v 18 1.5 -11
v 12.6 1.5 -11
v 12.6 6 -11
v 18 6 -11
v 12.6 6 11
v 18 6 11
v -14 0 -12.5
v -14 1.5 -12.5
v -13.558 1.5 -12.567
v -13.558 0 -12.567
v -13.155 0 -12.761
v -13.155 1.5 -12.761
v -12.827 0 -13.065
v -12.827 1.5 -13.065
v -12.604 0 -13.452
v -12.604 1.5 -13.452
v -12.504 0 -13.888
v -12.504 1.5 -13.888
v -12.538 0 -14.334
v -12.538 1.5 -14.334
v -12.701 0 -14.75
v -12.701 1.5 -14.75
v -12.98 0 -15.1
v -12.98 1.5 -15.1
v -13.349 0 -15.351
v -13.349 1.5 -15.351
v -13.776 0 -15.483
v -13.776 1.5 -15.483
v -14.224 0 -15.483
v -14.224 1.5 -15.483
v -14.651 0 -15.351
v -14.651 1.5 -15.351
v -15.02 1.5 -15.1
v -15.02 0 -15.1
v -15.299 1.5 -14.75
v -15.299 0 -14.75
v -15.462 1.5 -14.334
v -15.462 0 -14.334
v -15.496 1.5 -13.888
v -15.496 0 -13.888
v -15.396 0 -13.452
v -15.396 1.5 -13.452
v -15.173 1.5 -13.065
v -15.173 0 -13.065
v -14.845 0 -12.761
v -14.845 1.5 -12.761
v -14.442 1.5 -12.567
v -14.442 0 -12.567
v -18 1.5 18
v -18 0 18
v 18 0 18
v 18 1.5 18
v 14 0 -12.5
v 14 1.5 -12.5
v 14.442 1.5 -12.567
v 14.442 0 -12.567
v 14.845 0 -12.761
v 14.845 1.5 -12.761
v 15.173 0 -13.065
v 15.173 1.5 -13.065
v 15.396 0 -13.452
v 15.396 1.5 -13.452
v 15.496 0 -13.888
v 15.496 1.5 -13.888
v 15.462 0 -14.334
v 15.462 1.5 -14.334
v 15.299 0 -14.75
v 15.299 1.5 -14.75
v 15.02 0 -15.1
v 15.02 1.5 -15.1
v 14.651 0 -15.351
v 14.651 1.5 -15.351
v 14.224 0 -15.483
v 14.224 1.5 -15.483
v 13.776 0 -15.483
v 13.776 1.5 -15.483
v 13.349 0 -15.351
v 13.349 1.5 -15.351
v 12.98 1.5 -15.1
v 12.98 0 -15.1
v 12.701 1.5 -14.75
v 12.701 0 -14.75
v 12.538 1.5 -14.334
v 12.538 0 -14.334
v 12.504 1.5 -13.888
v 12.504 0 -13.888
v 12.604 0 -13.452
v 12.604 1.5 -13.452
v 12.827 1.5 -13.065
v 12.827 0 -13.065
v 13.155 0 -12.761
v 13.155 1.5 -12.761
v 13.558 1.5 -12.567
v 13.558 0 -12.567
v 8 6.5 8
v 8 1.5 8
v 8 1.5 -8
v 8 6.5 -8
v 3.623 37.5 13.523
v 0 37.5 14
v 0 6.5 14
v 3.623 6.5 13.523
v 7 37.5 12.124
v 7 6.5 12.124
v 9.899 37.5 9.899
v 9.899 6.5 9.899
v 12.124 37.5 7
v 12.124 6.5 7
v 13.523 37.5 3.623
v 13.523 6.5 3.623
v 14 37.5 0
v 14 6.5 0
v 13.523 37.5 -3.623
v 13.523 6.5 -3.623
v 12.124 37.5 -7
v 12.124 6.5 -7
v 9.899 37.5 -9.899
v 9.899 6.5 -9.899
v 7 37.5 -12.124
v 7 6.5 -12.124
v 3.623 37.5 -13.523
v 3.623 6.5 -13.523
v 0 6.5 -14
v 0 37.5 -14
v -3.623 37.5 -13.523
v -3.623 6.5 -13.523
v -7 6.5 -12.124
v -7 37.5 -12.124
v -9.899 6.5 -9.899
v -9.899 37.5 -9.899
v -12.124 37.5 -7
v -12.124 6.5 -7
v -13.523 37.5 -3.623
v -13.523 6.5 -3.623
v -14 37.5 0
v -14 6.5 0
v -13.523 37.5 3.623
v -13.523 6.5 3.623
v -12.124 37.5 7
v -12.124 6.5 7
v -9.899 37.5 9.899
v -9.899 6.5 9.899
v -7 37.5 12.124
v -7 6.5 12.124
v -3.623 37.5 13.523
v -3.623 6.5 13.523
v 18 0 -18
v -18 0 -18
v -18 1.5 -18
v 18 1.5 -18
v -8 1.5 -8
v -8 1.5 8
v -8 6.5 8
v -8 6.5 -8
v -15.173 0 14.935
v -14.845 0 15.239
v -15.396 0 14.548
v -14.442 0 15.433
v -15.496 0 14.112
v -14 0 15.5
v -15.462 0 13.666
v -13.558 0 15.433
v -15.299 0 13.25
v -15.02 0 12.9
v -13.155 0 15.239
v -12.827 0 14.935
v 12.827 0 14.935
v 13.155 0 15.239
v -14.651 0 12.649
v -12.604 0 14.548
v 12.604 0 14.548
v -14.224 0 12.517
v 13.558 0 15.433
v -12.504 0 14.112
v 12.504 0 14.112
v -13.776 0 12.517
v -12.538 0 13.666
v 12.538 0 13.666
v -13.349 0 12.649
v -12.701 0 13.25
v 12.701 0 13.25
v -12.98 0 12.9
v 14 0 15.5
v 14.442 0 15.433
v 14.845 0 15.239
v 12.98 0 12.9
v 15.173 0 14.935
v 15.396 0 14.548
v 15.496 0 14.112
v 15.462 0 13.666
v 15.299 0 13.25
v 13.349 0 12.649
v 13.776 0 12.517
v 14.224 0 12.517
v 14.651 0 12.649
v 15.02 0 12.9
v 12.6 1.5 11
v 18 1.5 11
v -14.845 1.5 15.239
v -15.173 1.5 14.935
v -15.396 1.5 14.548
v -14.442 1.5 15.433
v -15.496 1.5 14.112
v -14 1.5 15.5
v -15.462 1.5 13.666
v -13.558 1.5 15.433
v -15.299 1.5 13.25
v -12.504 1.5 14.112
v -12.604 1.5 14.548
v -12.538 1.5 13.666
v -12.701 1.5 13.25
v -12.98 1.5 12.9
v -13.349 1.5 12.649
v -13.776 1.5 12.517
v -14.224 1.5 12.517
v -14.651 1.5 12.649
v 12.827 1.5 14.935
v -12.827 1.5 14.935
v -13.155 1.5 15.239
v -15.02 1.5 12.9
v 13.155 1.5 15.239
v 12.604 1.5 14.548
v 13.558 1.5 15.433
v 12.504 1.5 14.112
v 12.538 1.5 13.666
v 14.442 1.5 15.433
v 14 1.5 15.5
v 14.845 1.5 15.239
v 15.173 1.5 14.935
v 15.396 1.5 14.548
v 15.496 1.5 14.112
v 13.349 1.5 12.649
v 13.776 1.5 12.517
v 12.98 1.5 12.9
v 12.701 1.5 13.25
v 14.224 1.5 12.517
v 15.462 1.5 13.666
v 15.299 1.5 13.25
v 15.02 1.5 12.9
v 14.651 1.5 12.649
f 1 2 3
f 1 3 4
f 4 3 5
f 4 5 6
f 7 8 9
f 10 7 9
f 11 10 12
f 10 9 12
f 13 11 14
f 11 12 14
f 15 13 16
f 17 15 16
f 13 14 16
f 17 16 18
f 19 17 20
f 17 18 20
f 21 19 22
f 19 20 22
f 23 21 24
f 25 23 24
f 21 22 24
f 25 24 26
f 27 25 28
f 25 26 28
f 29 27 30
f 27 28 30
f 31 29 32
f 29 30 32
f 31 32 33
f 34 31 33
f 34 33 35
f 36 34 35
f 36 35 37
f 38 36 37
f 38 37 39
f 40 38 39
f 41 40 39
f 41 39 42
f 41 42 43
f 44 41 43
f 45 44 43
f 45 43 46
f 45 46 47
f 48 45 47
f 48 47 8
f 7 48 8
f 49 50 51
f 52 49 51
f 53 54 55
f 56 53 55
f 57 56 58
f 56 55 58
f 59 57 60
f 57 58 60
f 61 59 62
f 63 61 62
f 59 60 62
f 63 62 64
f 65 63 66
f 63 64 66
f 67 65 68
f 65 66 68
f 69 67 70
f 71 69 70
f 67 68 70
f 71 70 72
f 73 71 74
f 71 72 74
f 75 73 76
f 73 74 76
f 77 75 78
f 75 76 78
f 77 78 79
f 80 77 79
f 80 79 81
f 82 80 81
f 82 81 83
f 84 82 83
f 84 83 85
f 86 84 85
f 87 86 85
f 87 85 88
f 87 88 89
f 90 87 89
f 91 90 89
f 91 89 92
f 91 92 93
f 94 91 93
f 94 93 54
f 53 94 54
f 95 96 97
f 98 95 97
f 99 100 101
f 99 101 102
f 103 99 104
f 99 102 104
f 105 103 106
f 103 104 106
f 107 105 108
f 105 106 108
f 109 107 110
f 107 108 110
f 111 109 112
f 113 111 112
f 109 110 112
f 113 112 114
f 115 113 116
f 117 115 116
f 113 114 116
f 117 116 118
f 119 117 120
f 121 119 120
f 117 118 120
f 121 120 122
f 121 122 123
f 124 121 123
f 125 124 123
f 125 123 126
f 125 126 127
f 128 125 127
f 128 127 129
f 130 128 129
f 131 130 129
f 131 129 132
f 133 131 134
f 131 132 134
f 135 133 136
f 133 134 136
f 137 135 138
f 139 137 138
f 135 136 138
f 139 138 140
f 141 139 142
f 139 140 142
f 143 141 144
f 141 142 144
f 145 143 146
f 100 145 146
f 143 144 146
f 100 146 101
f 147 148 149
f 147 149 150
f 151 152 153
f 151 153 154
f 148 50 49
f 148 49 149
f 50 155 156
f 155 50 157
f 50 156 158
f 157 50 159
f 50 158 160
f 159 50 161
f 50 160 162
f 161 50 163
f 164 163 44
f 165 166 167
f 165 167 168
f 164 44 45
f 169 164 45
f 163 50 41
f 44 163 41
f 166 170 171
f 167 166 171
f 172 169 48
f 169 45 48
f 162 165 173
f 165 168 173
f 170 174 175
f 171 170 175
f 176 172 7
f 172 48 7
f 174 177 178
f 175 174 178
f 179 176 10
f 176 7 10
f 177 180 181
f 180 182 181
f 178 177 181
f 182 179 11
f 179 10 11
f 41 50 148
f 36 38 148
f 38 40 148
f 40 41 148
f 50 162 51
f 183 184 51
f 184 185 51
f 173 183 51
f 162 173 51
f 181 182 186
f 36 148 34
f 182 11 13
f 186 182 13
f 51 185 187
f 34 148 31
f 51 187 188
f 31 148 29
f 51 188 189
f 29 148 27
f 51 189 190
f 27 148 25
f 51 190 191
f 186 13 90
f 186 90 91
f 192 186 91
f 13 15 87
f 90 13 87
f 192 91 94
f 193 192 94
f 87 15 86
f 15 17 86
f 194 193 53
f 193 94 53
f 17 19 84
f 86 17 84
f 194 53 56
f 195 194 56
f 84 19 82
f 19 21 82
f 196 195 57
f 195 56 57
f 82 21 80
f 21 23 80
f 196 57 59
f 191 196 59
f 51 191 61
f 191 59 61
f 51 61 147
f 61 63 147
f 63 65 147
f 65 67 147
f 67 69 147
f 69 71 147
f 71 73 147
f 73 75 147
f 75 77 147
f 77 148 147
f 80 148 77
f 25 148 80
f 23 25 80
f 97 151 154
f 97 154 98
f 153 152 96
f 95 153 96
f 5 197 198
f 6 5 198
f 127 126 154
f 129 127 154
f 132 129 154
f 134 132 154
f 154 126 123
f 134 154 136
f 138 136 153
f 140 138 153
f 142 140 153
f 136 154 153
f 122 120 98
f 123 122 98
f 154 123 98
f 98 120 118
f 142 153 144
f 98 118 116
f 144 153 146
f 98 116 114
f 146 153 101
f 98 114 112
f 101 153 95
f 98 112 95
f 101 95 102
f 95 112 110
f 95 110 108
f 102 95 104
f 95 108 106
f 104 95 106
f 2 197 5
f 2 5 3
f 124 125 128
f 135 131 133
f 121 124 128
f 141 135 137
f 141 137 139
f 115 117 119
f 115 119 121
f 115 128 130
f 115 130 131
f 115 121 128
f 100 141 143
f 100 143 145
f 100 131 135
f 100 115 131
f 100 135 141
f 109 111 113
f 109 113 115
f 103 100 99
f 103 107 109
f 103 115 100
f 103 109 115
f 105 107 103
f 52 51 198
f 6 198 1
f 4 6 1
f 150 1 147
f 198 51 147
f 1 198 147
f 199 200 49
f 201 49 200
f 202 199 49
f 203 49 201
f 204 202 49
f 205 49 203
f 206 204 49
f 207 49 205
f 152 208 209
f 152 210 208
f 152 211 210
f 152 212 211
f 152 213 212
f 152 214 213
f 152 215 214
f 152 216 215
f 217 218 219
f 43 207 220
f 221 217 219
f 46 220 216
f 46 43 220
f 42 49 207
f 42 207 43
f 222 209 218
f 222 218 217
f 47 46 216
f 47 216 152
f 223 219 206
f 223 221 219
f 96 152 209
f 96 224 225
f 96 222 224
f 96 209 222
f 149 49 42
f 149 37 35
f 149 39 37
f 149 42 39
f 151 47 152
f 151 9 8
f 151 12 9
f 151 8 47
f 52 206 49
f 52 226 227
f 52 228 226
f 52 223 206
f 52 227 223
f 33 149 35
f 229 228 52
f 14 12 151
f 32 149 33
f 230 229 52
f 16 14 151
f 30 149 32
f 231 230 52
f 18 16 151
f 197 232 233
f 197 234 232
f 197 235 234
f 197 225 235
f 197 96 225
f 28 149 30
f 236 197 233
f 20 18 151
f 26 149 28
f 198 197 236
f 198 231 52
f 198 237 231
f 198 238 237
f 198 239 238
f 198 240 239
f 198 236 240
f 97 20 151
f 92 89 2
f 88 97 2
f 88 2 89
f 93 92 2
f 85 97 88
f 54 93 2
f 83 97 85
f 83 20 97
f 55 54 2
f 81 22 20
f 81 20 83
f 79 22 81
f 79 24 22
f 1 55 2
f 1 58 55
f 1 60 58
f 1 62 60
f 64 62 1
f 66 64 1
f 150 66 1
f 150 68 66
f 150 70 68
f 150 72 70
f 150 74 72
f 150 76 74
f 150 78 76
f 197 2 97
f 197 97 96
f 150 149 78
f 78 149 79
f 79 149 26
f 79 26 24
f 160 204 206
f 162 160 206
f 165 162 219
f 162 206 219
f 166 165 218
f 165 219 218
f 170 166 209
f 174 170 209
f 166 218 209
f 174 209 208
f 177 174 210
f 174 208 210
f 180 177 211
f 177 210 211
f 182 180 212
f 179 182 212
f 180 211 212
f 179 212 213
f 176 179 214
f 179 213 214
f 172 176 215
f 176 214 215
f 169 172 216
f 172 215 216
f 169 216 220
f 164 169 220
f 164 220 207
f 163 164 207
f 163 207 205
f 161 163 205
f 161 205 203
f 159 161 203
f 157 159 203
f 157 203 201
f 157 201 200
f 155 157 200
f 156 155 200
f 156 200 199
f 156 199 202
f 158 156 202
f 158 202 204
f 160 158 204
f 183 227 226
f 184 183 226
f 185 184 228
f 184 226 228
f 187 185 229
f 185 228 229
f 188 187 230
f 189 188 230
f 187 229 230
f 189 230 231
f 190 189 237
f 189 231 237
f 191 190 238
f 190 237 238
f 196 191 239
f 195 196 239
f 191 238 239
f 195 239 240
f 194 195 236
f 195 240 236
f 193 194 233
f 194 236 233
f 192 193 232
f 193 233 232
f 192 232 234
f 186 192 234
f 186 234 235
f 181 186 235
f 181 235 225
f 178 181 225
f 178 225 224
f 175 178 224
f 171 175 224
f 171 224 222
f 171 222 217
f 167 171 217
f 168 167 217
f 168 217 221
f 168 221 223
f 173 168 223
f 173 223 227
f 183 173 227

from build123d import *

# Parameters (mm, degrees)
SKETCH1_W           = 36
SKETCH1_H           = 36
BOSS_EXTRUDE1_DEPTH = 1.5
SKETCH2_R           = 1.5
CUT_EXTRUDE1_DEPTH  = 26.5
SKETCH5_W           = 5.4
SKETCH5_H           = 22
BOSS_EXTRUDE4_DEPTH = 4.5
SKETCH6_W           = 16
SKETCH6_H           = 16
BOSS_EXTRUDE5_DEPTH = 5
SKETCH7_R           = 14
BOSS_EXTRUDE6_DEPTH = 31


with BuildPart() as part:
    # Sketch1 → Boss-Extrude1 (new body)
    with BuildSketch(Plane(origin=(0, 0, 0), x_dir=(1, 0, 0), z_dir=(0, 1, 0))):
        Rectangle(SKETCH1_W, SKETCH1_H)
    extrude(amount=BOSS_EXTRUDE1_DEPTH)

    # Sketch2 → Cut-Extrude1 (cut, through all)
    with BuildSketch(Plane(origin=(0, 1.5, 0), x_dir=(1, 0, 0), z_dir=(0, 1, 0))):
        with Locations(Location((14, 14, 0), (0, 0, 270))):
            Circle(SKETCH2_R)
        with Locations(Location((14, -14, 0), (0, 0, 270))):
            Circle(SKETCH2_R)
        with Locations(Location((-14, -14, 0), (0, 0, 270))):
            Circle(SKETCH2_R)
        with Locations(Location((-14, 14, 0), (0, 0, 270))):
            Circle(SKETCH2_R)
    extrude(amount=-CUT_EXTRUDE1_DEPTH, mode=Mode.SUBTRACT)

    # Sketch5 → Boss-Extrude4 (add)
    with BuildSketch(Plane(origin=(0, 1.5, 0), x_dir=(1, 0, 0), z_dir=(0, 1, 0))):
        with Locations((15.3, 0)):
            Rectangle(SKETCH5_W, SKETCH5_H)
    extrude(amount=BOSS_EXTRUDE4_DEPTH)

    # Sketch6 → Boss-Extrude5 (add)
    with BuildSketch(Plane(origin=(0, 1.5, 0), x_dir=(1, 0, 0), z_dir=(0, 1, 0))):
        Rectangle(SKETCH6_W, SKETCH6_H)
    extrude(amount=BOSS_EXTRUDE5_DEPTH)

    # Sketch7 → Boss-Extrude6 (add)
    with BuildSketch(Plane(origin=(0, 6.5, 0), x_dir=(1, 0, 0), z_dir=(0, 1, 0))):
        with Locations(Location((0, 0, 0), (0, 0, 270))):
            Circle(SKETCH7_R)
    extrude(amount=BOSS_EXTRUDE6_DEPTH)


solid = part.part
